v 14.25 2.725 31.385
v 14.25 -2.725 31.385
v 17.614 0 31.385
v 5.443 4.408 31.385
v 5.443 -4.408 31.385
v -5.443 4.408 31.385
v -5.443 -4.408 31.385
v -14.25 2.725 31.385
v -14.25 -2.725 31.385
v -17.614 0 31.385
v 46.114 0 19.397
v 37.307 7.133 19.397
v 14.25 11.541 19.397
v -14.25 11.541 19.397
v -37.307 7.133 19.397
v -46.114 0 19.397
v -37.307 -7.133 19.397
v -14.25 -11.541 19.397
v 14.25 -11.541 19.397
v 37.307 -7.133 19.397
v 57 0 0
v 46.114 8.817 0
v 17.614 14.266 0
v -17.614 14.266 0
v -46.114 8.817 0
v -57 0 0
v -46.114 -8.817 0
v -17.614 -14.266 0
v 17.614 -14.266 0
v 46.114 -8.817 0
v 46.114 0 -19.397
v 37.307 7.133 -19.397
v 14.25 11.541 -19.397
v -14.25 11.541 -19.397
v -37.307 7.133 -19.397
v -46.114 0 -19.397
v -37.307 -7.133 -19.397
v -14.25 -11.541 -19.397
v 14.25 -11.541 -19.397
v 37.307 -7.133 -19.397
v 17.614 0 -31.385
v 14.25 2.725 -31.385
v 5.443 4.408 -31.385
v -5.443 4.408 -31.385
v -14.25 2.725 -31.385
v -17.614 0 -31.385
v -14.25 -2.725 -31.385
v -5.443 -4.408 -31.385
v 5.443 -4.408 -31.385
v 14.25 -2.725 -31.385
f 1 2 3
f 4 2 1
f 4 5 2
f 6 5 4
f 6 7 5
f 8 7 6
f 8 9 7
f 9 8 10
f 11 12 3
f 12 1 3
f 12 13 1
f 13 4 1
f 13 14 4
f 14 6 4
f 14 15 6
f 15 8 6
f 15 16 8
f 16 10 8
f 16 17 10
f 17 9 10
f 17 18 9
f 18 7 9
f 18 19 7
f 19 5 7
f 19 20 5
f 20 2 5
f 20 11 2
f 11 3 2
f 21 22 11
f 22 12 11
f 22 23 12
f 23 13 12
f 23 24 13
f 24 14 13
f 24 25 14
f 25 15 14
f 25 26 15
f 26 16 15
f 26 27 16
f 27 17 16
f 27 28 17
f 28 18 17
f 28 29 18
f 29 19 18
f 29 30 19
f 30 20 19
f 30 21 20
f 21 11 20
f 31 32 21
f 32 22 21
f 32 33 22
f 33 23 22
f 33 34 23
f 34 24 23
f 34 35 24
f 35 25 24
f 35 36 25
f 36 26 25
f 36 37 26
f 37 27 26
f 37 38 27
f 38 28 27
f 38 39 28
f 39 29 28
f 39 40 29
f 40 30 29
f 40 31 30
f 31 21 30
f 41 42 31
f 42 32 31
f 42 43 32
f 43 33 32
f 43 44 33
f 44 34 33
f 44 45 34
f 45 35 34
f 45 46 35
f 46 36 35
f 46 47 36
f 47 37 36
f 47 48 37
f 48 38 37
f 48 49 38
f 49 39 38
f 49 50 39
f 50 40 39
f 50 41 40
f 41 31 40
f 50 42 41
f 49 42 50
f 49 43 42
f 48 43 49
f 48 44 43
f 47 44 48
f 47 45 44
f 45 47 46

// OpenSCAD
// Generated by SolidPython 1.0.1 on 2020-07-29 00:46:53


scale(v = [19, 5, 11]) {
	sphere(r = 3);
}
/***********************************************
*********      SolidPython code:      **********
************************************************
 
# import packages: SolidPython
from solid import *
from solid.utils import *
from itertools import chain, combinations, permutations


class Resize:

    def __init__(self, scad_file):
        self.scad_file = scad_file
        #self.scad_file = import_scad(scad_file)
        # cone/cylinder param:
        self.r1 = 0
        self.r2 = 0
        self.h = 0
        # rectangular prism param:
        self.w = 0
        self.l = 0
        # ellipse param:
        self.r = 0

    # import OpenScad code (file name corresponds to shape)


    # classify shape + parameters
    def assign(self, param1, param2, param3):
        if self.scad_file == 'cone.scad':
            self.r1 = param1
            self.r2 = param2
            self.h = param3
        elif self.scad_file == 'cylinder.scad':
            self.r1 = param1
            self.r2 = param2
            self.h = param3
        elif self.scad_file == 'rectangularPrism.scad':
            self.h = param1
            self.l = param2
            self.w = param3
        else:
            self.r = param1
            self.h = param2

    # resize parameters
    def iterate(self):
        x = range(3, 20, 2)
        i = 1
        if self.scad_file == 'cone.scad':
            tempList = list(permutations(x, 2))
            for temp in tempList:
                param1 = temp[0]
                param2 = temp[1]
                filepath = 'produced_scad_files/' + 'cone' + str(param1) + '_' + str(param2) + '_' + '.scad'
                scad_render_to_file(cylinder(h=param1, r1=param2, r2=0), filepath)

        elif self.scad_file == 'cylinder.scad':
            tempList = list(permutations(x, 3))
            for temp in tempList:
                param1 = temp[0]
                param2 = temp[1]
                filepath = 'produced_scad_files/' + 'cylinder' + str(param1) + '_' + str(param2) + '_' + '.scad'
                scad_render_to_file(cylinder(h=param1, r1=param2, r2=param2), filepath)

        elif self.scad_file == 'rectangularPrism.scad':
            tempList = list(permutations(x, 3))
            for temp in tempList:
                param1 = temp[0]
                param2 = temp[1]
                param3 = temp[2]
                filepath = 'produced_scad_files/' + 'rectangularPrism' + str(param1) + '_' + str(param2) + '_' + str(
                    param3) + '.scad'
                scad_render_to_file(cube(size=(param1, param2, param3)), filepath)

        elif self.scad_file == 'ellipse.scad':
            tempList = list(permutations(x, 4))
            for temp in tempList:
                param1 = temp[0]
                param2 = temp[1]
                param3 = temp[2]
                param4 = temp[3]
                filepath = 'produced_scad_files/' + 'ellipse' + str(param1) + '_' + str(param2) + '_' + str(param3) + '_' + str(param4) + '.scad'
                scad_render_to_file(scale([param1, param2, param3])(sphere(r=param4)), filepath)

    def render_to_scadfile(self):
        scad_render_to_file(scad, 'example.scad') 
 
************************************************/
